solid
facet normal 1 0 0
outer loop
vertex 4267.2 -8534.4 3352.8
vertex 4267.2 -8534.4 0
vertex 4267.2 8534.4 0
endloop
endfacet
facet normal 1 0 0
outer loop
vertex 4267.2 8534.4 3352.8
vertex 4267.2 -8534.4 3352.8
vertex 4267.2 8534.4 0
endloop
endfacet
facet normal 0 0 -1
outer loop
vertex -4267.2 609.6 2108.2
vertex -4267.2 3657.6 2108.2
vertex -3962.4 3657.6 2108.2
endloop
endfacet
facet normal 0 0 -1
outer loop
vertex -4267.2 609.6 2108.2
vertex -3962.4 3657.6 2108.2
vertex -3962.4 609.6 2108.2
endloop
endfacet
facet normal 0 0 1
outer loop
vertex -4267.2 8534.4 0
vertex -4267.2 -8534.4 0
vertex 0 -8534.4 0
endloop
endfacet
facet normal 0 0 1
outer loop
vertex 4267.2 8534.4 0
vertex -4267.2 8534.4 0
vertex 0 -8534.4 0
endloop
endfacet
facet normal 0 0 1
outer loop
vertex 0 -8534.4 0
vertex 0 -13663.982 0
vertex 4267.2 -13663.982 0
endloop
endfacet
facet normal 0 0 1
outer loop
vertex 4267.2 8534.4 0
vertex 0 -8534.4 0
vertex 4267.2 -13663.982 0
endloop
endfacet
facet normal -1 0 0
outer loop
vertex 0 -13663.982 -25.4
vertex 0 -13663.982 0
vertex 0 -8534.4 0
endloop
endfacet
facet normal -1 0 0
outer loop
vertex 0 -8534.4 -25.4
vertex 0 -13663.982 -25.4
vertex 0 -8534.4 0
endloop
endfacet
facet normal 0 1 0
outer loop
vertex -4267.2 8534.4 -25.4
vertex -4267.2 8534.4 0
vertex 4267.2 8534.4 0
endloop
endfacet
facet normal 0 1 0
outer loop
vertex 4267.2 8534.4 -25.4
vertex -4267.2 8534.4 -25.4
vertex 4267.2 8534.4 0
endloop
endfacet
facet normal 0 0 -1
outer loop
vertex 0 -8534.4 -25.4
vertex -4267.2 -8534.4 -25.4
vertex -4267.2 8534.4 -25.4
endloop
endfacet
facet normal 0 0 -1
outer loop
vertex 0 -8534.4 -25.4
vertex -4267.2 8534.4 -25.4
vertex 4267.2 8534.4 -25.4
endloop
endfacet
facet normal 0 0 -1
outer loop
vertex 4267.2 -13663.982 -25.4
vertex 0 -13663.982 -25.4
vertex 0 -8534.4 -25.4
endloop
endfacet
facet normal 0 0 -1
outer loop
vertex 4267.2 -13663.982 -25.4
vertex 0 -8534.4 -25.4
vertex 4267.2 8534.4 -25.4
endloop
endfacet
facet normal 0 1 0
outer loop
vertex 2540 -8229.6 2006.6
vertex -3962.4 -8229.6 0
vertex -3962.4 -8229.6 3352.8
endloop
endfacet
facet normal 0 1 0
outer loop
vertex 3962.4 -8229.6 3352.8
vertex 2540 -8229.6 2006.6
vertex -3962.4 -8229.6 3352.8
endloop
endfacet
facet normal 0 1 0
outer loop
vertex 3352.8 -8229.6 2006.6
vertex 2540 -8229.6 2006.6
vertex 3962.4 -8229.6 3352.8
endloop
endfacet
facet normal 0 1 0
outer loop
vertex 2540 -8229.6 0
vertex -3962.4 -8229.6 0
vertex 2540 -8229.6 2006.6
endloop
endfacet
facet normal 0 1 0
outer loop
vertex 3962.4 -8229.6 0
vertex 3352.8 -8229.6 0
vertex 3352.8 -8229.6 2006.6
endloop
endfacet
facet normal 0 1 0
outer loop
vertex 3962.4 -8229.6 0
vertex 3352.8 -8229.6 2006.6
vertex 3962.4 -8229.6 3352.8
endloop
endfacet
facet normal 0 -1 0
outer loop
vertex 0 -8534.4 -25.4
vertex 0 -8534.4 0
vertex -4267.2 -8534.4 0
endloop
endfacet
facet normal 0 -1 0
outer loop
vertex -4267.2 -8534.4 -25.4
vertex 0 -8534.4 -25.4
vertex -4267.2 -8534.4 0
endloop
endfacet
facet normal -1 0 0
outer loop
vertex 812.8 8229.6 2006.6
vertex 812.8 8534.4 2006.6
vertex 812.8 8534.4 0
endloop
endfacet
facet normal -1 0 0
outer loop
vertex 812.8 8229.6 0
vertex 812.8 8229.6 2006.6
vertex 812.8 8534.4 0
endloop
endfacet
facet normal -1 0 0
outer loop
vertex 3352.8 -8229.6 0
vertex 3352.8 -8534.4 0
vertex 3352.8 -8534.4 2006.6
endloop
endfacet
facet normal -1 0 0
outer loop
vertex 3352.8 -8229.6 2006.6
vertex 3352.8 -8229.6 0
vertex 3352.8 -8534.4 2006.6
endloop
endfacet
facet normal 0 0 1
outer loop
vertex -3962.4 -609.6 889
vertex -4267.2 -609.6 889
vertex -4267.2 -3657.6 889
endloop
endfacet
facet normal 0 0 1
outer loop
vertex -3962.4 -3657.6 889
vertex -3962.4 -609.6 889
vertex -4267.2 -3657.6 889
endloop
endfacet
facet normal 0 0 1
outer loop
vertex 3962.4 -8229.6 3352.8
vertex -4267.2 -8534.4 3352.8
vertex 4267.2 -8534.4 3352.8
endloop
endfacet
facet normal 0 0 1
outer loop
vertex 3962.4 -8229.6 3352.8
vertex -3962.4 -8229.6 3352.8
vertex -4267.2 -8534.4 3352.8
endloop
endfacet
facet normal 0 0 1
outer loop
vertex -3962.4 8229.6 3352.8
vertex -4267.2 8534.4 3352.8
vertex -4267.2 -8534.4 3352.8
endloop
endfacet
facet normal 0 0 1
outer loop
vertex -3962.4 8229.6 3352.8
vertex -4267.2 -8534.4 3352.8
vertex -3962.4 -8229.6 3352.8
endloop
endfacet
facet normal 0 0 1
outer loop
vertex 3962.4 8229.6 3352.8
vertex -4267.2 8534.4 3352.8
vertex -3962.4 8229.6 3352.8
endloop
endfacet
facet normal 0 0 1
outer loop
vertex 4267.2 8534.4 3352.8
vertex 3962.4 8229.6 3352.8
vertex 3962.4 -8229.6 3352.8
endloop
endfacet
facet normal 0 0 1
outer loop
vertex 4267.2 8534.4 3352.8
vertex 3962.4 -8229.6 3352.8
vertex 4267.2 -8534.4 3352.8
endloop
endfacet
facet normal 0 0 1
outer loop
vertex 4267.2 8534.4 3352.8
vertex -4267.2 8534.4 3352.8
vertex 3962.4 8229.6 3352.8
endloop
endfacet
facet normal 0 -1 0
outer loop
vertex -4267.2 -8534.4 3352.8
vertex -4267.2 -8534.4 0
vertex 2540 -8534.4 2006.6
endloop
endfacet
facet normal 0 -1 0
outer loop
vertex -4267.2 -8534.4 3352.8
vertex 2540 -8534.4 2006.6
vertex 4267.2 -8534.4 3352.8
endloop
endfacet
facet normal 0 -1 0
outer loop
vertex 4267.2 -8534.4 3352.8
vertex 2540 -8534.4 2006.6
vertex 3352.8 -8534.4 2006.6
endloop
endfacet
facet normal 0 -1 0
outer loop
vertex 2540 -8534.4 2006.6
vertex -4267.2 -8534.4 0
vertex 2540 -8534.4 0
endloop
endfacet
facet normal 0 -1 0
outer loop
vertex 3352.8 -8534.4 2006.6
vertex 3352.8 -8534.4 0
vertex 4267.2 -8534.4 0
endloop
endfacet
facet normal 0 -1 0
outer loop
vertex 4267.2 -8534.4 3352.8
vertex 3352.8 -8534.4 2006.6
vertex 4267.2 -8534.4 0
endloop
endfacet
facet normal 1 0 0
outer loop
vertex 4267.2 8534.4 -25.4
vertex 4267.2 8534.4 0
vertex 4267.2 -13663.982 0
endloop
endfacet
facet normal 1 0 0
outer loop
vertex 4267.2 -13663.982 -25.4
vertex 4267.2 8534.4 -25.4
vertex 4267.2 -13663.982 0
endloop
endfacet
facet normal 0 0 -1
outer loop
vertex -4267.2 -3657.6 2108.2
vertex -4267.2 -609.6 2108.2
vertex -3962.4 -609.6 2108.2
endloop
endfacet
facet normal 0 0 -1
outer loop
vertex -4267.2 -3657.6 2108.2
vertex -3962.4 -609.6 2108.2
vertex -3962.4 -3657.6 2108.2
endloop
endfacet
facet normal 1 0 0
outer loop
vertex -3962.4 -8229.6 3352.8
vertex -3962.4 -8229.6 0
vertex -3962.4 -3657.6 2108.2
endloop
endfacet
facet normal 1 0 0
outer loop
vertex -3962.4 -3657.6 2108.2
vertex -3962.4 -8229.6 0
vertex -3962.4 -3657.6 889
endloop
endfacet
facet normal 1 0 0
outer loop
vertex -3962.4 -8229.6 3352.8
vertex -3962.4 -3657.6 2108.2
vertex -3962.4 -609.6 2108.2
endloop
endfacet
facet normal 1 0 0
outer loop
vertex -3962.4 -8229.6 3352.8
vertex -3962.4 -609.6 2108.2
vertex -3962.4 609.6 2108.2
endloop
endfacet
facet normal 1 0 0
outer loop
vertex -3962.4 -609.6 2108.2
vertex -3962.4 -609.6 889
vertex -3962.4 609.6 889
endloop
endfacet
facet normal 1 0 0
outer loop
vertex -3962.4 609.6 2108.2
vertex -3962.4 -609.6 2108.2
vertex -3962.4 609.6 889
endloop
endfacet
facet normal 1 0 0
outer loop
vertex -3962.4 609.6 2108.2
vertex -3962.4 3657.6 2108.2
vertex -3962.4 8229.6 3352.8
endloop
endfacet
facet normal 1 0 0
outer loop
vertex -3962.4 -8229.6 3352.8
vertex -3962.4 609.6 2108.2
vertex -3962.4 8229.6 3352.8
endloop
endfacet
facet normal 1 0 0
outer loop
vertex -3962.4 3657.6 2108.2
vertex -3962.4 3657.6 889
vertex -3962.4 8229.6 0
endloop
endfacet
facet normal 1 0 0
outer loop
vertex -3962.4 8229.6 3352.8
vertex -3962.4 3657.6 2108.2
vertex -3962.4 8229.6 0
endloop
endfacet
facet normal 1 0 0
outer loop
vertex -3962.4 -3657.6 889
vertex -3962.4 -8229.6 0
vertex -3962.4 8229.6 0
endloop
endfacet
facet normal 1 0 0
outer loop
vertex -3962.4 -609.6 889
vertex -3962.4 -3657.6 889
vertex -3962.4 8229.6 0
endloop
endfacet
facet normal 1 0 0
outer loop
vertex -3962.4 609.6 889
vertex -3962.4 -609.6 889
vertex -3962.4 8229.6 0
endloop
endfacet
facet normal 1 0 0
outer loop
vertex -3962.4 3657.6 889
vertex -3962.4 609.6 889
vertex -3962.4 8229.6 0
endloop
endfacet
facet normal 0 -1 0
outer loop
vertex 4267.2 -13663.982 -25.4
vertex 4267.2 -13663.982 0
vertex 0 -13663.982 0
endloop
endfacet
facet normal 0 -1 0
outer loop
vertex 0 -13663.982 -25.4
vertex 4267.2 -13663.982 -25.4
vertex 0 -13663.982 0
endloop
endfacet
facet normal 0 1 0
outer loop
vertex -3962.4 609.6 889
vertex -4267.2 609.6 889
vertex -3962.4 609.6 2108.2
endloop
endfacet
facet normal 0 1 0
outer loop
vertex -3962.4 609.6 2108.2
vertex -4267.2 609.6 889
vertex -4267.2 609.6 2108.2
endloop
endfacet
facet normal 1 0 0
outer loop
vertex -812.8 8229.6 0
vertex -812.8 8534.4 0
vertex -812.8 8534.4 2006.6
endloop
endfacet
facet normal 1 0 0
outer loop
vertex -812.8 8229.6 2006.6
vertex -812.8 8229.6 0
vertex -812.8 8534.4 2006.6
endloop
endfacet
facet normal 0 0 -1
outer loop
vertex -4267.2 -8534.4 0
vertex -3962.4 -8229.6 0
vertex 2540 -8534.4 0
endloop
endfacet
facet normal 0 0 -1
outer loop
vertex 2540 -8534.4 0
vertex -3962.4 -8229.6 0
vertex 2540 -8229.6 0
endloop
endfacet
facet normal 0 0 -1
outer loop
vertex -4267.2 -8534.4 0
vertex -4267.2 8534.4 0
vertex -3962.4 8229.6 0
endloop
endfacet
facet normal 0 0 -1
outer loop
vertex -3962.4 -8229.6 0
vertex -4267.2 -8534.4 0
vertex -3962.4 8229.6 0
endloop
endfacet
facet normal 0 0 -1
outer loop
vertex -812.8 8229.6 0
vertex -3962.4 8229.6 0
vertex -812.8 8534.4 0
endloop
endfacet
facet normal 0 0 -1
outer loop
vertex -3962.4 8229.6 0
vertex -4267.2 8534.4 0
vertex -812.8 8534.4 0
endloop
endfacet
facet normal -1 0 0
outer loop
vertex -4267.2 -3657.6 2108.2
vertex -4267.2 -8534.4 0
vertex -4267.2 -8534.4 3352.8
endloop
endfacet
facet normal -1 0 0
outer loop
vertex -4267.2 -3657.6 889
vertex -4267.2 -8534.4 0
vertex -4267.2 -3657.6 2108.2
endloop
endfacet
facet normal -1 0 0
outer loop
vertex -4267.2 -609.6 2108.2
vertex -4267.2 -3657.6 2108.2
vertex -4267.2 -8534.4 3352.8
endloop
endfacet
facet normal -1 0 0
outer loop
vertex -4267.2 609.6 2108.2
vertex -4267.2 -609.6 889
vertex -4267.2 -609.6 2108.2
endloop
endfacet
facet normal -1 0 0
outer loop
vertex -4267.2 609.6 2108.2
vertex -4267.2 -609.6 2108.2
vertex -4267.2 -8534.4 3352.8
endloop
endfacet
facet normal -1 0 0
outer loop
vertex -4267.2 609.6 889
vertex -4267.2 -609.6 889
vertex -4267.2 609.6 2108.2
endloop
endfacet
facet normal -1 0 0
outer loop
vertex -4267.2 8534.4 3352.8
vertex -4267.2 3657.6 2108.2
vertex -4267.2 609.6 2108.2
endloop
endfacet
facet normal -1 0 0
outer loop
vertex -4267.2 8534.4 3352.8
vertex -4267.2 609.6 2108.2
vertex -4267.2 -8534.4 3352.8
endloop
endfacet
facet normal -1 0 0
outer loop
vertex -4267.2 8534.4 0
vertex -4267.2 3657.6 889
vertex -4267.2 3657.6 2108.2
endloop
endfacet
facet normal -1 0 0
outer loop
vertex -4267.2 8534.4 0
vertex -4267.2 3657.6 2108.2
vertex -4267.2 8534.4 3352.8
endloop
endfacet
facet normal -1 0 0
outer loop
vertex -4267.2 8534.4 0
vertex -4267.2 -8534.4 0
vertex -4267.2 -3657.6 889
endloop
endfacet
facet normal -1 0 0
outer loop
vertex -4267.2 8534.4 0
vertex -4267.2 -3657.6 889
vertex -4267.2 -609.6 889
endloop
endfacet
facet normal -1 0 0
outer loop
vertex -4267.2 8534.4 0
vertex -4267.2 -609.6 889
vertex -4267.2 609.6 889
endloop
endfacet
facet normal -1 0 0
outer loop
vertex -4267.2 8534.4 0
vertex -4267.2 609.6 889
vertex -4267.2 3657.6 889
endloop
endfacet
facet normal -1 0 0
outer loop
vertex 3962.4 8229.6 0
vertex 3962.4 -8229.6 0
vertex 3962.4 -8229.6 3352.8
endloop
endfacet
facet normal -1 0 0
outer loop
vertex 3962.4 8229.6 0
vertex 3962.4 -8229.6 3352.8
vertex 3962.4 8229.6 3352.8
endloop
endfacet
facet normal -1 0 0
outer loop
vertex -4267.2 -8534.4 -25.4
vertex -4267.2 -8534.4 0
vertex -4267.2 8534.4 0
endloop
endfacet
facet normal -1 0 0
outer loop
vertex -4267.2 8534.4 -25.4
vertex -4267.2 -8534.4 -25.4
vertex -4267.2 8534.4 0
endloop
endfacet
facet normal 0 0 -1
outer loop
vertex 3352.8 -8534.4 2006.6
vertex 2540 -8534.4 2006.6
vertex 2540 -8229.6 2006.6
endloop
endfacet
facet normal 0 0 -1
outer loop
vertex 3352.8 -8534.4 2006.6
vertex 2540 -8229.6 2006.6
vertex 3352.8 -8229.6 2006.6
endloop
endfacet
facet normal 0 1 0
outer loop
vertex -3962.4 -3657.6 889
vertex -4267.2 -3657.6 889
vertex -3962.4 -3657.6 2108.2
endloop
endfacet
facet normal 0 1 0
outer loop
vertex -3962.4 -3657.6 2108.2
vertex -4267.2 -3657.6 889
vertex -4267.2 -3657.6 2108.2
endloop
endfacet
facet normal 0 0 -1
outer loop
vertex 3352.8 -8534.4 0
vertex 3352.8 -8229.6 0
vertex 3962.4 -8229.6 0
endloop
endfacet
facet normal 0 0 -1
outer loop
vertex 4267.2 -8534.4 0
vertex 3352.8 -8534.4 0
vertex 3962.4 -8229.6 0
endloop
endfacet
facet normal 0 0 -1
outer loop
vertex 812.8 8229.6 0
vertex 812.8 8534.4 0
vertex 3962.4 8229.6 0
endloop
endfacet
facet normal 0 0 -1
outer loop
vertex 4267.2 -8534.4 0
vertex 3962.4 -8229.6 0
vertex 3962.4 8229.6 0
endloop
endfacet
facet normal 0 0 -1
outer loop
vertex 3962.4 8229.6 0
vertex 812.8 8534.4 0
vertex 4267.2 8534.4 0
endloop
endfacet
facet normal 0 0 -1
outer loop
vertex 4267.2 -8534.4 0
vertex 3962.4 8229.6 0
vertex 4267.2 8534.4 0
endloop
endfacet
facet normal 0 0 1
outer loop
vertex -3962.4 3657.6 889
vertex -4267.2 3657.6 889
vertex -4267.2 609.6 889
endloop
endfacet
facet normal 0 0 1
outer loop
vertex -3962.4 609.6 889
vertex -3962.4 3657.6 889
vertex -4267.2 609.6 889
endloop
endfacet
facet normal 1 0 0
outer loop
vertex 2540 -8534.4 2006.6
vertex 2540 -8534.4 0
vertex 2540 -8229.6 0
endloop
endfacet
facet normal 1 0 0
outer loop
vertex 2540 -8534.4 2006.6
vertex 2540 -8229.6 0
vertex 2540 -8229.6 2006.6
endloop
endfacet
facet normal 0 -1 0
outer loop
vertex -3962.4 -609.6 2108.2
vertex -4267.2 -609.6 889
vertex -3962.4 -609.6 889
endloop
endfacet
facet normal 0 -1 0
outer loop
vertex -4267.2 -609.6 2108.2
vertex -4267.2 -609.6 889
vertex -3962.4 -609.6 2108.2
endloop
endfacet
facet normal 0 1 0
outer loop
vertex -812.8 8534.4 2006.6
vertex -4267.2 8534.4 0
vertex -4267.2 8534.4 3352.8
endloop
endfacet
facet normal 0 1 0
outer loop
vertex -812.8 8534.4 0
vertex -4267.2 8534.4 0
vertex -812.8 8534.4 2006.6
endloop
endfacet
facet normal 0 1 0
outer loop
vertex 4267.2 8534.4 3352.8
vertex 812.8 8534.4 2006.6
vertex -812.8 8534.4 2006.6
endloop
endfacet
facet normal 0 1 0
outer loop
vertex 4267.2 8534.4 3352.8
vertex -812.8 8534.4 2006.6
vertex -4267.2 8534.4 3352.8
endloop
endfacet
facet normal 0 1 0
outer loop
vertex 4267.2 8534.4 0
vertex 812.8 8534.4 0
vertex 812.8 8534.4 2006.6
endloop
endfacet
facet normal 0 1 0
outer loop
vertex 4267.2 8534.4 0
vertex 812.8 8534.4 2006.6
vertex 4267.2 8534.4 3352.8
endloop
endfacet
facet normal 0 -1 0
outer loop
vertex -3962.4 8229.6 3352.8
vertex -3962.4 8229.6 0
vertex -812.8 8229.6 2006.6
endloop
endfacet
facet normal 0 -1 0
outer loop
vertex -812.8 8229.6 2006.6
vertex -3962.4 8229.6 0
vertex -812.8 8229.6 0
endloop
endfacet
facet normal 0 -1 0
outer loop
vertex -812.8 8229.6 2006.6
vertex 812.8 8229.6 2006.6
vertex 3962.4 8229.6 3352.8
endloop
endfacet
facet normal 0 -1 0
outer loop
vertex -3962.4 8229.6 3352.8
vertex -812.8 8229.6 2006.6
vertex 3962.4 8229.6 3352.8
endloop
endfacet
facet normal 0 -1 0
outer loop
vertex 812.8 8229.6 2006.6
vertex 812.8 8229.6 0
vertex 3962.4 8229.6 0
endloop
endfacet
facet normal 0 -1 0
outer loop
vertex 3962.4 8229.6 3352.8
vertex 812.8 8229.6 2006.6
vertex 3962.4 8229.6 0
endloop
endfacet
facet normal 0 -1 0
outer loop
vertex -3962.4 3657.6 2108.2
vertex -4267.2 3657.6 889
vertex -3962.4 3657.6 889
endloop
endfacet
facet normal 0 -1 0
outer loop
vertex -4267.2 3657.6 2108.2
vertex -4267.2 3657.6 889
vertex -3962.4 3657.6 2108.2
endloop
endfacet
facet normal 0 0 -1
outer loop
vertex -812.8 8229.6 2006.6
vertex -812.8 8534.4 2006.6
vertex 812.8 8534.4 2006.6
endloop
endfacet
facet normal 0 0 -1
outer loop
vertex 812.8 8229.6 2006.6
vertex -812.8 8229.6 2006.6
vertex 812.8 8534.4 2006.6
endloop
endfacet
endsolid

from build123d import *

# Parameters (mm, degrees)
F0_W     = 8534.4
F0_H     = 17068.8
F0_W_2   = 7924.8
F0_H_2   = 16459.2
F1_DEPTH = 3352.8
F3_DEPTH = 25.4
F4_W     = 812.8
F4_H     = 2032
F5_DEPTH = 304.8
F6_W     = 3048
F6_H     = 1219.2
F7_DEPTH = 304.8
F9_DEPTH = 304.8


with BuildPart() as f1:
    # F0 (on Top) → F1 (new body)
    with BuildSketch(Plane.XY):
        Rectangle(F0_W, F0_H)
        Rectangle(F0_W_2, F0_H_2, mode=Mode.SUBTRACT)
    extrude(amount=F1_DEPTH)

    # F4 (on face) → F5 (cut, through all)
    with BuildSketch(Plane.XZ.offset(8534.4)):
        with Locations((2946.4, 990.6)):
            Rectangle(F4_W, F4_H)
    extrude(amount=-F5_DEPTH, mode=Mode.SUBTRACT)

    # F6 (on face) → F7 (cut, through all)
    with BuildSketch(Plane(origin=(-4267.2, 0, 0), x_dir=(0, -1, 0), z_dir=(-1, 0, 0))):
        with Locations((-2133.6, 1498.6)):
            Rectangle(F6_W, F6_H)
        with Locations((2133.6, 1498.6)):
            Rectangle(F6_W, F6_H)
    extrude(amount=-F7_DEPTH, mode=Mode.SUBTRACT)

    # F8 (on face) → F9 (cut, through all)
    with BuildSketch(Plane(origin=(0, 8534.4, 0), x_dir=(-1, 0, 0), z_dir=(0, 1, 0))):
        Polygon((812.8, 2006.6), (0, 2006.6), (-812.8, 2006.6), (-812.8, -25.4), (0, -25.4), (812.8, -25.4), align=None)
    extrude(amount=-F9_DEPTH, mode=Mode.SUBTRACT)


with BuildPart() as f3:
    # F2 (on face) → F3 (new body)
    with BuildSketch(Plane(origin=(0, 0, 0), x_dir=(1, 0, 0), z_dir=(0, 0, -1))):
        Polygon((0, 8534.4), (-4267.2, 8534.4), (-4267.2, -8534.4), (4267.2, -8534.4), (4267.2, 8534.4), (4267.2, 13663.9823913574), (0, 13663.9823913574), align=None)
    extrude(amount=F3_DEPTH)


solid = Compound([f1.part, f3.part])
